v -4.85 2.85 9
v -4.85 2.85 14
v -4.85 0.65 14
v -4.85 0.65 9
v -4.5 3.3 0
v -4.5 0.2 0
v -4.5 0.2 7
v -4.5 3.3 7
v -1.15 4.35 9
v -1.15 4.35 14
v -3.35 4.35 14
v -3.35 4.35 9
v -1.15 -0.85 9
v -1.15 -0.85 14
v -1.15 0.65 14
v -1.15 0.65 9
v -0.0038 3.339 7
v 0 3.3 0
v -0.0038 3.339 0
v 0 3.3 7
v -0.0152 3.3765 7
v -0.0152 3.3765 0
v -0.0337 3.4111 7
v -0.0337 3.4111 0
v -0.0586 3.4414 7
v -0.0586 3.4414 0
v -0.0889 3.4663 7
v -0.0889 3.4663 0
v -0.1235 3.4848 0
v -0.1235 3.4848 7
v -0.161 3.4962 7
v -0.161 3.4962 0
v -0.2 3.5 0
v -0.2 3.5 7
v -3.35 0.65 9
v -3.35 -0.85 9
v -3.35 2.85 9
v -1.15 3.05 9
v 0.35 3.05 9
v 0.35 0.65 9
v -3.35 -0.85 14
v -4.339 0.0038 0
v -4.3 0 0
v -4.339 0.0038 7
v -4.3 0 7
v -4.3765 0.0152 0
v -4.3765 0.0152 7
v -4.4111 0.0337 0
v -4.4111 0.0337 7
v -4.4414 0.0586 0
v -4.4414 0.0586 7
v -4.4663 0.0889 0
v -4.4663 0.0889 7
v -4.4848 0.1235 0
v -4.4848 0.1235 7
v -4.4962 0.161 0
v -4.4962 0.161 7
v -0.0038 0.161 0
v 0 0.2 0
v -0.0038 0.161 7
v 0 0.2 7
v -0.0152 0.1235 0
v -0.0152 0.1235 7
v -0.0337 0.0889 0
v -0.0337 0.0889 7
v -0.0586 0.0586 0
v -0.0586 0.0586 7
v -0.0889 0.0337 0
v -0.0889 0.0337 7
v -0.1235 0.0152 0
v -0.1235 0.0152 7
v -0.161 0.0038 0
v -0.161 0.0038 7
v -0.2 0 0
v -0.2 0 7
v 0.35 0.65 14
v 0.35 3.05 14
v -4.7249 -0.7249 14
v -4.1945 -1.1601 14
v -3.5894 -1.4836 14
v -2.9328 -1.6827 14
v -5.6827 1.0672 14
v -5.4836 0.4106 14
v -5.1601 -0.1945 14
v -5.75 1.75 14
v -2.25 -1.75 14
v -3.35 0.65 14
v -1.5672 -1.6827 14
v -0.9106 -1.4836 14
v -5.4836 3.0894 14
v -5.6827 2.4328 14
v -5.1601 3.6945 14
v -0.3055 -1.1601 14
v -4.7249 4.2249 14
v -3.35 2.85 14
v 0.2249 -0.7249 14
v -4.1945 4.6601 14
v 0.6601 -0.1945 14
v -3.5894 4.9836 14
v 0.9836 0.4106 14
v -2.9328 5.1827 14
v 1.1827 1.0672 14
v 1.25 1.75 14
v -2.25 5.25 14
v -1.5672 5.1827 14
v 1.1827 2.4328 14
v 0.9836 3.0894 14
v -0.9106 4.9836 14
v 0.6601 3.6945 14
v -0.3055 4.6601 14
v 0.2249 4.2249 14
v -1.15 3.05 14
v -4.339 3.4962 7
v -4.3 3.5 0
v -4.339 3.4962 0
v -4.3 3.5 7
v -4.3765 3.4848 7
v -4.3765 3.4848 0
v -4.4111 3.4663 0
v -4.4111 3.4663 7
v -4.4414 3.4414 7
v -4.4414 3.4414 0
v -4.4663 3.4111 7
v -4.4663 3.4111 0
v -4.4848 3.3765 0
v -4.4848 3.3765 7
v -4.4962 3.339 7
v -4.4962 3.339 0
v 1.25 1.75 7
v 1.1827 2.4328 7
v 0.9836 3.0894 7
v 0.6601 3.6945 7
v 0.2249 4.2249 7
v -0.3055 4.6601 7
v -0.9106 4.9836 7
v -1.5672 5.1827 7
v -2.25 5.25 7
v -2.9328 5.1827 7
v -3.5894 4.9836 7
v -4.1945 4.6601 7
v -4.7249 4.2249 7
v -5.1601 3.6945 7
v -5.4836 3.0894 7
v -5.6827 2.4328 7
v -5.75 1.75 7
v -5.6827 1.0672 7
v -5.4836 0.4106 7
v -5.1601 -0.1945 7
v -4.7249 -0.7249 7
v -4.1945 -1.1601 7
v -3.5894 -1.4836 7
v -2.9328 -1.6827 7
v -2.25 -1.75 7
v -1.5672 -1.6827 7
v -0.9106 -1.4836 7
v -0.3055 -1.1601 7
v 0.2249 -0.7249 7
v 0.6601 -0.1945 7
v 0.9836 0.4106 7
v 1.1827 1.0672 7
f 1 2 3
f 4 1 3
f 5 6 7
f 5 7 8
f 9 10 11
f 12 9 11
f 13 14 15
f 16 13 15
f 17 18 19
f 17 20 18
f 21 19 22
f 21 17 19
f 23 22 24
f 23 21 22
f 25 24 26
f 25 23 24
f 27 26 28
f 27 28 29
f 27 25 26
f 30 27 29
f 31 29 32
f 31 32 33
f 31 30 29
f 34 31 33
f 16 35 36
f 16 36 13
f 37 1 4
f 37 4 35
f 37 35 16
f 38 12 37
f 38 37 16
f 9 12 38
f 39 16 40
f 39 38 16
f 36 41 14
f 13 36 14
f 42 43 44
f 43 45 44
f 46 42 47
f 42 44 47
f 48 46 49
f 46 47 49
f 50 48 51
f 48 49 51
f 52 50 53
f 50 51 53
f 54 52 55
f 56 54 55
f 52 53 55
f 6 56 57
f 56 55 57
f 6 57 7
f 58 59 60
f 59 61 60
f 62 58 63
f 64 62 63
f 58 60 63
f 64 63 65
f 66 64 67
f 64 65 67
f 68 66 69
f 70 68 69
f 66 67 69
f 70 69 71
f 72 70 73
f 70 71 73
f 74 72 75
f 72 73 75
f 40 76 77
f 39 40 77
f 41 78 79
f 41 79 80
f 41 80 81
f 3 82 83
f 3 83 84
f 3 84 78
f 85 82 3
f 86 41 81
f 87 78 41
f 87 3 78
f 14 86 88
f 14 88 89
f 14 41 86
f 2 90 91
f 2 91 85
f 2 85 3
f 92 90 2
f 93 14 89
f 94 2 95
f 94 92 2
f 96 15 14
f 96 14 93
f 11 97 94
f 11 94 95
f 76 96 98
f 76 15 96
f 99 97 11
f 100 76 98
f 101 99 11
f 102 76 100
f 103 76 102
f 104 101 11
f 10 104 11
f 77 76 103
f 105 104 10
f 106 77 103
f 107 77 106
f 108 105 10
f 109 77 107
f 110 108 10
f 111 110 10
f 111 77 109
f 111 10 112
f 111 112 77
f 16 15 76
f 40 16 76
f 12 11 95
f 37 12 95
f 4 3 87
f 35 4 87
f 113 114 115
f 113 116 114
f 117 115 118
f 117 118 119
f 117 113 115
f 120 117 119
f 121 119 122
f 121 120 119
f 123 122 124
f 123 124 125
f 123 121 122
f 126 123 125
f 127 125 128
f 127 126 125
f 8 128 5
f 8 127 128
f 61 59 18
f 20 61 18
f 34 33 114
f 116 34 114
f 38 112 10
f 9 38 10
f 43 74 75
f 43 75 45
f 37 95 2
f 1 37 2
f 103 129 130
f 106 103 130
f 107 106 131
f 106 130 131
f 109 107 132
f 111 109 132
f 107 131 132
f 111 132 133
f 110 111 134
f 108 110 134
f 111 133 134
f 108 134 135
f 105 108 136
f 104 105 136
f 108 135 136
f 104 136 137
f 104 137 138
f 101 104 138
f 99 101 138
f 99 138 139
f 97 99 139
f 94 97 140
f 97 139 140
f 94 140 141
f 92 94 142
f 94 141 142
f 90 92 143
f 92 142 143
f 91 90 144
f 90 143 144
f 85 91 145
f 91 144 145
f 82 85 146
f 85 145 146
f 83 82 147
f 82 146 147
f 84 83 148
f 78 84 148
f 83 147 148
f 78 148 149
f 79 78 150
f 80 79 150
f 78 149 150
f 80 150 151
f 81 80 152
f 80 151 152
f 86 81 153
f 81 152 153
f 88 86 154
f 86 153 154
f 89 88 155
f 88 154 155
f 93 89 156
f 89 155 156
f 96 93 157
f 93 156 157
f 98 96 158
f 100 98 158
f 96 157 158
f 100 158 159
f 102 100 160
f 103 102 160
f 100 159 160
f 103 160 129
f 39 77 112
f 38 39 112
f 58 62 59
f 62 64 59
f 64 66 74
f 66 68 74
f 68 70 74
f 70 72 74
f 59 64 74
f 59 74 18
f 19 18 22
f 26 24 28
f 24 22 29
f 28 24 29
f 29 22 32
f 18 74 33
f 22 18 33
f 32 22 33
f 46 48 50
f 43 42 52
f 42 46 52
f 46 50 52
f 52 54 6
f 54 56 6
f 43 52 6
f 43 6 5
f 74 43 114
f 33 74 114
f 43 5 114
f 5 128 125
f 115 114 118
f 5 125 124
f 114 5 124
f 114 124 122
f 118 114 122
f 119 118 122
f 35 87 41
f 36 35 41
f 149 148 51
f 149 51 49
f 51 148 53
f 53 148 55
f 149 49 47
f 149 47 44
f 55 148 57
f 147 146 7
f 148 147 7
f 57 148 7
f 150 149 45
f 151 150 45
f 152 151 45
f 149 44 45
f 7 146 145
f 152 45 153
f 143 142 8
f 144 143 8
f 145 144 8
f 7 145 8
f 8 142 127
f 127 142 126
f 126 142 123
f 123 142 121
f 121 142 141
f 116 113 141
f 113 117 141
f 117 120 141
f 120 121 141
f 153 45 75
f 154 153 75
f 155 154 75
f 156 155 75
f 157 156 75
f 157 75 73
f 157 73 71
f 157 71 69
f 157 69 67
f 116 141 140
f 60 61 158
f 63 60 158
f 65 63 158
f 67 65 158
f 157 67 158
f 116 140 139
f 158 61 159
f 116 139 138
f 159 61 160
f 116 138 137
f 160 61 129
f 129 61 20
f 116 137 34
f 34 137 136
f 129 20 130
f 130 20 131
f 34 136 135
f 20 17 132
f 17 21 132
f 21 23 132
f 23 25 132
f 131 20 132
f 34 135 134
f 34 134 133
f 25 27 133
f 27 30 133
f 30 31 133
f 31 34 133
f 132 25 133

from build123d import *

# Parameters (mm, degrees)
SKETCH2_W           = 3.5
SKETCH2_H           = 4.5
BOSS_EXTRUDE1_DEPTH = 7
SKETCH3_R           = 3.5
BOSS_EXTRUDE2_DEPTH = 7
CUT_EXTRUDE1_DEPTH  = 5
FILLET1_R           = 0.2
FILLET2_R           = 0.2


with BuildPart() as part:
    # Sketch2 → Boss-Extrude1 (new body)
    with BuildSketch(Plane(origin=(0, 0, 0), x_dir=(0, 1, 0), z_dir=(0, 0, 1))):
        with Locations((1.75, 2.25)):
            Rectangle(SKETCH2_W, SKETCH2_H)
    extrude(amount=BOSS_EXTRUDE1_DEPTH)

    # Sketch3 → Boss-Extrude2 (add)
    with BuildSketch(Plane.XY.offset(7)):
        with Locations((-2.25, 1.75)):
            Circle(SKETCH3_R)
    extrude(amount=BOSS_EXTRUDE2_DEPTH)

    # Sketch4 → Cut-Extrude1 (cut)
    with BuildSketch(Plane.XY.offset(14)):
        Polygon((-3.35, 2.85), (-4.85, 2.85), (-4.85, 0.65), (-3.35, 0.65), (-3.35, -0.85), (-1.15, -0.85), (-1.15, 0.65), (0.35, 0.65), (0.35, 3.05), (-1.15, 3.05), (-1.15, 4.35), (-3.35, 4.35), align=None)
    extrude(amount=-CUT_EXTRUDE1_DEPTH, mode=Mode.SUBTRACT)

    # Fillet1
    fillet1_edges = [part.edges().sort_by_distance(p)[0] for p in [
        (0, 3.5, 3.5),
    ]]
    fillet(fillet1_edges, radius=FILLET1_R)

    # Fillet2
    fillet2_edges = [part.edges().sort_by_distance(p)[0] for p in [
        (-4.5, 0, 3.5),
        (-4.5, 3.5, 3.5),
        (0, 0, 3.5),
    ]]
    fillet(fillet2_edges, radius=FILLET2_R)


solid = part.part
